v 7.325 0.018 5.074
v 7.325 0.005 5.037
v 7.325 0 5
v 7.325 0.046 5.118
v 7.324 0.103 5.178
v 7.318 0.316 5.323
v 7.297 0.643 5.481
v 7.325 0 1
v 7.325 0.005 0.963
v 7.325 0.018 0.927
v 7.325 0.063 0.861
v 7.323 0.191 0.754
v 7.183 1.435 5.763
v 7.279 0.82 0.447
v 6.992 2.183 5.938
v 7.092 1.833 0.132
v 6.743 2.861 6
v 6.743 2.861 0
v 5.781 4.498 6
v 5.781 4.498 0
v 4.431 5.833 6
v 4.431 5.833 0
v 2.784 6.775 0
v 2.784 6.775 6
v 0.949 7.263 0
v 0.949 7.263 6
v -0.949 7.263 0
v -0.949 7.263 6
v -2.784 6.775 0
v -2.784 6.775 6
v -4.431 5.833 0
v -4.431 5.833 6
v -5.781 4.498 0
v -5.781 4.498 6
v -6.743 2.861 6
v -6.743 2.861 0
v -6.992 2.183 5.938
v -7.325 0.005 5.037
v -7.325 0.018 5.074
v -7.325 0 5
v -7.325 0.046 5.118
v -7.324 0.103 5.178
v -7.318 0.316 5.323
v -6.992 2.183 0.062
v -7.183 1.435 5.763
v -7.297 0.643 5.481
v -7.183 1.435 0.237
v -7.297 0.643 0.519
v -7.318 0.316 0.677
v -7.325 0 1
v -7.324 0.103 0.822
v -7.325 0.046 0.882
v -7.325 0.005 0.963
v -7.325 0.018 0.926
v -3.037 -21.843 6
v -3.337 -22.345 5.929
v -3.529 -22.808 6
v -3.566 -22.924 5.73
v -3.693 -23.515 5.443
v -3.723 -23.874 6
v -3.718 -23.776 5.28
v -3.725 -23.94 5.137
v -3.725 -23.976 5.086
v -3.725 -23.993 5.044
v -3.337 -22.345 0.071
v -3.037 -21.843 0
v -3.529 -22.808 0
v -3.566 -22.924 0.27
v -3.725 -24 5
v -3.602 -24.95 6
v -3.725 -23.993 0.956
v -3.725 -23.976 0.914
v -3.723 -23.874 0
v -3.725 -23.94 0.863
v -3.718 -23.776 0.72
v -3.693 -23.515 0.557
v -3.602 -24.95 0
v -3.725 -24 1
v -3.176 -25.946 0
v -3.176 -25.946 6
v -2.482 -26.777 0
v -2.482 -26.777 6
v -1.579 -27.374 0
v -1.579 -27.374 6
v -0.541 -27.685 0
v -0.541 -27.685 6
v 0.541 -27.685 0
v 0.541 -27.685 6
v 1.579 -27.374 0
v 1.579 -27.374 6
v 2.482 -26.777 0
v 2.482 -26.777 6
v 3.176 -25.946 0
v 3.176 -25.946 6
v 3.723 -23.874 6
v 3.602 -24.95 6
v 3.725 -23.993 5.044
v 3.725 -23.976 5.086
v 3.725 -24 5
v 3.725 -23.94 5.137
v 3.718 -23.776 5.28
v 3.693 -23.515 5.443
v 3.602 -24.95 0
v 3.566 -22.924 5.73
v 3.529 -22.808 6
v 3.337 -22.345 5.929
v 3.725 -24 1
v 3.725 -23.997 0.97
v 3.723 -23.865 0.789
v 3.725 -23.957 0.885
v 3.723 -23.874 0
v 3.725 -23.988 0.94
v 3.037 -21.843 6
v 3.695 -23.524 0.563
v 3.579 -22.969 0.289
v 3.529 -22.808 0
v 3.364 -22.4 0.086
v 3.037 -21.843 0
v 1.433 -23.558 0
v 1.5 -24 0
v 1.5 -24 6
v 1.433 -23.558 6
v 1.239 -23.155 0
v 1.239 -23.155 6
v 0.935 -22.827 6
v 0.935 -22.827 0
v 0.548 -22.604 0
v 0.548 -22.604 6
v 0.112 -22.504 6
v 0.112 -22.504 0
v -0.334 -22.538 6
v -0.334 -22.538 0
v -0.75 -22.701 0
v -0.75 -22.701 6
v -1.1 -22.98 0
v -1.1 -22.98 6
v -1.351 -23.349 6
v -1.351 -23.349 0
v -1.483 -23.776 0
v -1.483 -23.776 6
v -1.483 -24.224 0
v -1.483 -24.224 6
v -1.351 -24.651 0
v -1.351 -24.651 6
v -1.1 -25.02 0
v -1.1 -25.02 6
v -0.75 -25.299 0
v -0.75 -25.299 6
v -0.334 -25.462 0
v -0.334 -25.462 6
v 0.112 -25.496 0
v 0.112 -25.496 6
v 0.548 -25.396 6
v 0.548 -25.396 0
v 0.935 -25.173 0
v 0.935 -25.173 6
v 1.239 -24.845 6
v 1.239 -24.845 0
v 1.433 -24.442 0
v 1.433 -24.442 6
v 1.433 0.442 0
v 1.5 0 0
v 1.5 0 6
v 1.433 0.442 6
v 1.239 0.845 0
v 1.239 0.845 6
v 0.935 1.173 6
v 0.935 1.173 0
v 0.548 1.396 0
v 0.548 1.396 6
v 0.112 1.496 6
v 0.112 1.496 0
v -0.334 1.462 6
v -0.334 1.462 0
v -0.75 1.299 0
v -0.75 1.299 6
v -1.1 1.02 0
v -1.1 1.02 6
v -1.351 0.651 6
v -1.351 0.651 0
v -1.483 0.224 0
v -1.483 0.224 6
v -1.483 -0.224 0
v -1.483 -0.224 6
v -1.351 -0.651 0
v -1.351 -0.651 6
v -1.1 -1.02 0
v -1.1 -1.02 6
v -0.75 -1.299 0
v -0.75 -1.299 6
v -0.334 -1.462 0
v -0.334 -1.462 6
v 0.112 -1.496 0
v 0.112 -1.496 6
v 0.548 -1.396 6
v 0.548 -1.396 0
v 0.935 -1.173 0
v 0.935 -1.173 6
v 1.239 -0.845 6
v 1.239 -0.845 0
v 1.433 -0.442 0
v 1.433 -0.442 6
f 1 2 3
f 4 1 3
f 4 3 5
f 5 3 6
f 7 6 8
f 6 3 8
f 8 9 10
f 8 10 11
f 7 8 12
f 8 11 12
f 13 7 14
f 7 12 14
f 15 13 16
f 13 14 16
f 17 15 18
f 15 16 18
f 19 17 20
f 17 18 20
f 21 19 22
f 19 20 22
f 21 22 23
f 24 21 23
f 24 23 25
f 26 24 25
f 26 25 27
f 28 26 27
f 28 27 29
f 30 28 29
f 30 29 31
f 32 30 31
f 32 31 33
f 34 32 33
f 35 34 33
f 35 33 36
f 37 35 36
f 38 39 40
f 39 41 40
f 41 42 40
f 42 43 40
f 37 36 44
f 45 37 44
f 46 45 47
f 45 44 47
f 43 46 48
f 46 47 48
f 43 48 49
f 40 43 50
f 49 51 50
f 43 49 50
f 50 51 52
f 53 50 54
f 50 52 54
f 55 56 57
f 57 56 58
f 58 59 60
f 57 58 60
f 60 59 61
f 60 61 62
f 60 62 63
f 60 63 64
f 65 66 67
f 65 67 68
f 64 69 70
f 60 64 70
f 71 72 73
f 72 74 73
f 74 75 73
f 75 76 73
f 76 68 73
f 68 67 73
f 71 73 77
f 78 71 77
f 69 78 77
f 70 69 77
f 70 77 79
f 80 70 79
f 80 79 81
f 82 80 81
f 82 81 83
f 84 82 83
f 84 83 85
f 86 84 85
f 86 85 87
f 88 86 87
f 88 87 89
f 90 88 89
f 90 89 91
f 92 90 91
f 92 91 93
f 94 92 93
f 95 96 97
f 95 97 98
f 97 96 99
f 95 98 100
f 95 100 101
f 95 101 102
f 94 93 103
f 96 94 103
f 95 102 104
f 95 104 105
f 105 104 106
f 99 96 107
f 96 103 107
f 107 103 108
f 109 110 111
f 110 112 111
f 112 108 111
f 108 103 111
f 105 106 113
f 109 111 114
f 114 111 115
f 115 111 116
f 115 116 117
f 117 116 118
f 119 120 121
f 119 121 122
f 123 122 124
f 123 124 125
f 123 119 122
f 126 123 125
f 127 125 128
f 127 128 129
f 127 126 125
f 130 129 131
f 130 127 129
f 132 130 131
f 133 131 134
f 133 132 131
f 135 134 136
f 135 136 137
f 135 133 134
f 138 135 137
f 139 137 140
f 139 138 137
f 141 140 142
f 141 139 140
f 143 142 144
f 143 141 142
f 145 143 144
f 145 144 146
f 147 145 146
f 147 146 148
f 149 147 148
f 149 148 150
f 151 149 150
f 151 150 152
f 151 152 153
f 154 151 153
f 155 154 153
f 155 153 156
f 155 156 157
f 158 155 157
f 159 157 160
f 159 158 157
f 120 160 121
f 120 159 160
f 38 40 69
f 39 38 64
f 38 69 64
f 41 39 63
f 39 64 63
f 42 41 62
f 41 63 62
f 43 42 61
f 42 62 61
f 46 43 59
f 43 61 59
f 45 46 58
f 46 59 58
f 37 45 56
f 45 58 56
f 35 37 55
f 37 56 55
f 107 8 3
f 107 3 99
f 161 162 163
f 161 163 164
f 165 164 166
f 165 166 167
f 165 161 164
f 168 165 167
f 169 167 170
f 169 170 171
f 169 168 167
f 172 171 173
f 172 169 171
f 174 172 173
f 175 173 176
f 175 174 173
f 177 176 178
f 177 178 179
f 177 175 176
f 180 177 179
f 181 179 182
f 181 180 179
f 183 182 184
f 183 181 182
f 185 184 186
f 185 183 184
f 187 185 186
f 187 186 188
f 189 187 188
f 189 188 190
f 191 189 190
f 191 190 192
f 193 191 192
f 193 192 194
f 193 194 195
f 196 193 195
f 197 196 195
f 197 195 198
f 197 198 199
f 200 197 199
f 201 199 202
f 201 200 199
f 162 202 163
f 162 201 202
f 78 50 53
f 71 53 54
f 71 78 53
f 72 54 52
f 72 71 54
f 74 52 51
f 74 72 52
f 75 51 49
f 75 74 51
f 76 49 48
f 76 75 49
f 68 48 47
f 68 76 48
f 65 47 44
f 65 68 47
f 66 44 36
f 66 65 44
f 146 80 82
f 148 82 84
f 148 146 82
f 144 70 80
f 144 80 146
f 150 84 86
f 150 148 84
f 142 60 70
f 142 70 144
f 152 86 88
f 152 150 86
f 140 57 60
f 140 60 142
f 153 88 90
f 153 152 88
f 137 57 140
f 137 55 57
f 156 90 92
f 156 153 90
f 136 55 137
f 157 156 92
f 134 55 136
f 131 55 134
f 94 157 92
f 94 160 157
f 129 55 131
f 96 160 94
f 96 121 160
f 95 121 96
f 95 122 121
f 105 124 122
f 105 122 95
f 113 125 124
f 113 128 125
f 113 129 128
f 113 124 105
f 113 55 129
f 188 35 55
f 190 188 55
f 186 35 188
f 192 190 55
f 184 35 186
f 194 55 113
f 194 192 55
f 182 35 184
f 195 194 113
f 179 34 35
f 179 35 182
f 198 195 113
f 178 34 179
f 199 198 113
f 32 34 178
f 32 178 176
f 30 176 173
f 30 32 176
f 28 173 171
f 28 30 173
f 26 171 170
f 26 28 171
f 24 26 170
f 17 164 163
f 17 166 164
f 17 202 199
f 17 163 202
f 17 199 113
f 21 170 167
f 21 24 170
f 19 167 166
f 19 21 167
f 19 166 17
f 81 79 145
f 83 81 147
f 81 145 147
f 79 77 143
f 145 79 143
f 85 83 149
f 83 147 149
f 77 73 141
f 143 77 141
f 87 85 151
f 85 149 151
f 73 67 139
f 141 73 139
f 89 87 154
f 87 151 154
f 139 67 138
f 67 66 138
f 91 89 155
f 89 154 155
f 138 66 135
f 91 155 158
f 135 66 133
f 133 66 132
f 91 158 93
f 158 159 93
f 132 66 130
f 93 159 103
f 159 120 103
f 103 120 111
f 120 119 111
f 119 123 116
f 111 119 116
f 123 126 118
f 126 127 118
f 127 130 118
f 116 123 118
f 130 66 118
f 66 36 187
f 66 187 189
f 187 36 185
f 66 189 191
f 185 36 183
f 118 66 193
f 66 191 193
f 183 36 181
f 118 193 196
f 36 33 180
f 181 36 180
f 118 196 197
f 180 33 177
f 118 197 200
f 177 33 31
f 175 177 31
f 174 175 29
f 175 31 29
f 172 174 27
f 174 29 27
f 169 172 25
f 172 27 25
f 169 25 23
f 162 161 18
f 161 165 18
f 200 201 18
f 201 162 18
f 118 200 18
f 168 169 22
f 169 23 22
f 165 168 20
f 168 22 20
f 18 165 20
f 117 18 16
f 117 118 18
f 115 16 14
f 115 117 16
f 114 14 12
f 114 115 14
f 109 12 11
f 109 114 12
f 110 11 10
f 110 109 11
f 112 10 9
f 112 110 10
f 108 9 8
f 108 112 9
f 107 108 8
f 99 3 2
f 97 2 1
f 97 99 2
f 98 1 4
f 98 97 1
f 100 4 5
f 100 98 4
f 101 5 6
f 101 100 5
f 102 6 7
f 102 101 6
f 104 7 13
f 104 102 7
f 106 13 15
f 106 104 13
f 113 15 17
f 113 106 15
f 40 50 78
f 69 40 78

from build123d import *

# Parameters (mm, degrees)
SKETCH_R    = 1.5
PAD_DEPTH   = 6
FILLET_R    = 1
FILLET001_R = 1
FILLET002_R = 1
FILLET003_R = 1


with BuildPart() as part:
    # Sketch → Pad (new body)
    with BuildSketch(Plane.XY):
        with BuildLine():
            Line((-7.325, 0), (-3.725, -24))
            ThreePointArc((-3.725, -24), (0, -27.725), (3.725, -24))
            Line((7.325, 0), (3.725, -24))
            ThreePointArc((7.325, 0), (0, 7.325), (-7.325, 0))
        make_face()
        Circle(SKETCH_R, mode=Mode.SUBTRACT)
        with Locations((0, -24)):
            Circle(SKETCH_R, mode=Mode.SUBTRACT)
    extrude(amount=PAD_DEPTH)

    # Fillet
    fillet_edges = [part.edges().sort_by_distance(p)[0] for p in [
        (-5.525, -12, 6),
    ]]
    fillet(fillet_edges, radius=FILLET_R)

    # Fillet001
    fillet001_edges = [part.edges().sort_by_distance(p)[0] for p in [
        (5.525, -12, 6),
    ]]
    fillet(fillet001_edges, radius=FILLET001_R)

    # Fillet002
    fillet002_edges = [part.edges().sort_by_distance(p)[0] for p in [
        (-5.525, -12, 0),
    ]]
    fillet(fillet002_edges, radius=FILLET002_R)

    # Fillet003
    fillet003_edges = [part.edges().sort_by_distance(p)[0] for p in [
        (5.525, -12, 0),
    ]]
    fillet(fillet003_edges, radius=FILLET003_R)


solid = part.part
